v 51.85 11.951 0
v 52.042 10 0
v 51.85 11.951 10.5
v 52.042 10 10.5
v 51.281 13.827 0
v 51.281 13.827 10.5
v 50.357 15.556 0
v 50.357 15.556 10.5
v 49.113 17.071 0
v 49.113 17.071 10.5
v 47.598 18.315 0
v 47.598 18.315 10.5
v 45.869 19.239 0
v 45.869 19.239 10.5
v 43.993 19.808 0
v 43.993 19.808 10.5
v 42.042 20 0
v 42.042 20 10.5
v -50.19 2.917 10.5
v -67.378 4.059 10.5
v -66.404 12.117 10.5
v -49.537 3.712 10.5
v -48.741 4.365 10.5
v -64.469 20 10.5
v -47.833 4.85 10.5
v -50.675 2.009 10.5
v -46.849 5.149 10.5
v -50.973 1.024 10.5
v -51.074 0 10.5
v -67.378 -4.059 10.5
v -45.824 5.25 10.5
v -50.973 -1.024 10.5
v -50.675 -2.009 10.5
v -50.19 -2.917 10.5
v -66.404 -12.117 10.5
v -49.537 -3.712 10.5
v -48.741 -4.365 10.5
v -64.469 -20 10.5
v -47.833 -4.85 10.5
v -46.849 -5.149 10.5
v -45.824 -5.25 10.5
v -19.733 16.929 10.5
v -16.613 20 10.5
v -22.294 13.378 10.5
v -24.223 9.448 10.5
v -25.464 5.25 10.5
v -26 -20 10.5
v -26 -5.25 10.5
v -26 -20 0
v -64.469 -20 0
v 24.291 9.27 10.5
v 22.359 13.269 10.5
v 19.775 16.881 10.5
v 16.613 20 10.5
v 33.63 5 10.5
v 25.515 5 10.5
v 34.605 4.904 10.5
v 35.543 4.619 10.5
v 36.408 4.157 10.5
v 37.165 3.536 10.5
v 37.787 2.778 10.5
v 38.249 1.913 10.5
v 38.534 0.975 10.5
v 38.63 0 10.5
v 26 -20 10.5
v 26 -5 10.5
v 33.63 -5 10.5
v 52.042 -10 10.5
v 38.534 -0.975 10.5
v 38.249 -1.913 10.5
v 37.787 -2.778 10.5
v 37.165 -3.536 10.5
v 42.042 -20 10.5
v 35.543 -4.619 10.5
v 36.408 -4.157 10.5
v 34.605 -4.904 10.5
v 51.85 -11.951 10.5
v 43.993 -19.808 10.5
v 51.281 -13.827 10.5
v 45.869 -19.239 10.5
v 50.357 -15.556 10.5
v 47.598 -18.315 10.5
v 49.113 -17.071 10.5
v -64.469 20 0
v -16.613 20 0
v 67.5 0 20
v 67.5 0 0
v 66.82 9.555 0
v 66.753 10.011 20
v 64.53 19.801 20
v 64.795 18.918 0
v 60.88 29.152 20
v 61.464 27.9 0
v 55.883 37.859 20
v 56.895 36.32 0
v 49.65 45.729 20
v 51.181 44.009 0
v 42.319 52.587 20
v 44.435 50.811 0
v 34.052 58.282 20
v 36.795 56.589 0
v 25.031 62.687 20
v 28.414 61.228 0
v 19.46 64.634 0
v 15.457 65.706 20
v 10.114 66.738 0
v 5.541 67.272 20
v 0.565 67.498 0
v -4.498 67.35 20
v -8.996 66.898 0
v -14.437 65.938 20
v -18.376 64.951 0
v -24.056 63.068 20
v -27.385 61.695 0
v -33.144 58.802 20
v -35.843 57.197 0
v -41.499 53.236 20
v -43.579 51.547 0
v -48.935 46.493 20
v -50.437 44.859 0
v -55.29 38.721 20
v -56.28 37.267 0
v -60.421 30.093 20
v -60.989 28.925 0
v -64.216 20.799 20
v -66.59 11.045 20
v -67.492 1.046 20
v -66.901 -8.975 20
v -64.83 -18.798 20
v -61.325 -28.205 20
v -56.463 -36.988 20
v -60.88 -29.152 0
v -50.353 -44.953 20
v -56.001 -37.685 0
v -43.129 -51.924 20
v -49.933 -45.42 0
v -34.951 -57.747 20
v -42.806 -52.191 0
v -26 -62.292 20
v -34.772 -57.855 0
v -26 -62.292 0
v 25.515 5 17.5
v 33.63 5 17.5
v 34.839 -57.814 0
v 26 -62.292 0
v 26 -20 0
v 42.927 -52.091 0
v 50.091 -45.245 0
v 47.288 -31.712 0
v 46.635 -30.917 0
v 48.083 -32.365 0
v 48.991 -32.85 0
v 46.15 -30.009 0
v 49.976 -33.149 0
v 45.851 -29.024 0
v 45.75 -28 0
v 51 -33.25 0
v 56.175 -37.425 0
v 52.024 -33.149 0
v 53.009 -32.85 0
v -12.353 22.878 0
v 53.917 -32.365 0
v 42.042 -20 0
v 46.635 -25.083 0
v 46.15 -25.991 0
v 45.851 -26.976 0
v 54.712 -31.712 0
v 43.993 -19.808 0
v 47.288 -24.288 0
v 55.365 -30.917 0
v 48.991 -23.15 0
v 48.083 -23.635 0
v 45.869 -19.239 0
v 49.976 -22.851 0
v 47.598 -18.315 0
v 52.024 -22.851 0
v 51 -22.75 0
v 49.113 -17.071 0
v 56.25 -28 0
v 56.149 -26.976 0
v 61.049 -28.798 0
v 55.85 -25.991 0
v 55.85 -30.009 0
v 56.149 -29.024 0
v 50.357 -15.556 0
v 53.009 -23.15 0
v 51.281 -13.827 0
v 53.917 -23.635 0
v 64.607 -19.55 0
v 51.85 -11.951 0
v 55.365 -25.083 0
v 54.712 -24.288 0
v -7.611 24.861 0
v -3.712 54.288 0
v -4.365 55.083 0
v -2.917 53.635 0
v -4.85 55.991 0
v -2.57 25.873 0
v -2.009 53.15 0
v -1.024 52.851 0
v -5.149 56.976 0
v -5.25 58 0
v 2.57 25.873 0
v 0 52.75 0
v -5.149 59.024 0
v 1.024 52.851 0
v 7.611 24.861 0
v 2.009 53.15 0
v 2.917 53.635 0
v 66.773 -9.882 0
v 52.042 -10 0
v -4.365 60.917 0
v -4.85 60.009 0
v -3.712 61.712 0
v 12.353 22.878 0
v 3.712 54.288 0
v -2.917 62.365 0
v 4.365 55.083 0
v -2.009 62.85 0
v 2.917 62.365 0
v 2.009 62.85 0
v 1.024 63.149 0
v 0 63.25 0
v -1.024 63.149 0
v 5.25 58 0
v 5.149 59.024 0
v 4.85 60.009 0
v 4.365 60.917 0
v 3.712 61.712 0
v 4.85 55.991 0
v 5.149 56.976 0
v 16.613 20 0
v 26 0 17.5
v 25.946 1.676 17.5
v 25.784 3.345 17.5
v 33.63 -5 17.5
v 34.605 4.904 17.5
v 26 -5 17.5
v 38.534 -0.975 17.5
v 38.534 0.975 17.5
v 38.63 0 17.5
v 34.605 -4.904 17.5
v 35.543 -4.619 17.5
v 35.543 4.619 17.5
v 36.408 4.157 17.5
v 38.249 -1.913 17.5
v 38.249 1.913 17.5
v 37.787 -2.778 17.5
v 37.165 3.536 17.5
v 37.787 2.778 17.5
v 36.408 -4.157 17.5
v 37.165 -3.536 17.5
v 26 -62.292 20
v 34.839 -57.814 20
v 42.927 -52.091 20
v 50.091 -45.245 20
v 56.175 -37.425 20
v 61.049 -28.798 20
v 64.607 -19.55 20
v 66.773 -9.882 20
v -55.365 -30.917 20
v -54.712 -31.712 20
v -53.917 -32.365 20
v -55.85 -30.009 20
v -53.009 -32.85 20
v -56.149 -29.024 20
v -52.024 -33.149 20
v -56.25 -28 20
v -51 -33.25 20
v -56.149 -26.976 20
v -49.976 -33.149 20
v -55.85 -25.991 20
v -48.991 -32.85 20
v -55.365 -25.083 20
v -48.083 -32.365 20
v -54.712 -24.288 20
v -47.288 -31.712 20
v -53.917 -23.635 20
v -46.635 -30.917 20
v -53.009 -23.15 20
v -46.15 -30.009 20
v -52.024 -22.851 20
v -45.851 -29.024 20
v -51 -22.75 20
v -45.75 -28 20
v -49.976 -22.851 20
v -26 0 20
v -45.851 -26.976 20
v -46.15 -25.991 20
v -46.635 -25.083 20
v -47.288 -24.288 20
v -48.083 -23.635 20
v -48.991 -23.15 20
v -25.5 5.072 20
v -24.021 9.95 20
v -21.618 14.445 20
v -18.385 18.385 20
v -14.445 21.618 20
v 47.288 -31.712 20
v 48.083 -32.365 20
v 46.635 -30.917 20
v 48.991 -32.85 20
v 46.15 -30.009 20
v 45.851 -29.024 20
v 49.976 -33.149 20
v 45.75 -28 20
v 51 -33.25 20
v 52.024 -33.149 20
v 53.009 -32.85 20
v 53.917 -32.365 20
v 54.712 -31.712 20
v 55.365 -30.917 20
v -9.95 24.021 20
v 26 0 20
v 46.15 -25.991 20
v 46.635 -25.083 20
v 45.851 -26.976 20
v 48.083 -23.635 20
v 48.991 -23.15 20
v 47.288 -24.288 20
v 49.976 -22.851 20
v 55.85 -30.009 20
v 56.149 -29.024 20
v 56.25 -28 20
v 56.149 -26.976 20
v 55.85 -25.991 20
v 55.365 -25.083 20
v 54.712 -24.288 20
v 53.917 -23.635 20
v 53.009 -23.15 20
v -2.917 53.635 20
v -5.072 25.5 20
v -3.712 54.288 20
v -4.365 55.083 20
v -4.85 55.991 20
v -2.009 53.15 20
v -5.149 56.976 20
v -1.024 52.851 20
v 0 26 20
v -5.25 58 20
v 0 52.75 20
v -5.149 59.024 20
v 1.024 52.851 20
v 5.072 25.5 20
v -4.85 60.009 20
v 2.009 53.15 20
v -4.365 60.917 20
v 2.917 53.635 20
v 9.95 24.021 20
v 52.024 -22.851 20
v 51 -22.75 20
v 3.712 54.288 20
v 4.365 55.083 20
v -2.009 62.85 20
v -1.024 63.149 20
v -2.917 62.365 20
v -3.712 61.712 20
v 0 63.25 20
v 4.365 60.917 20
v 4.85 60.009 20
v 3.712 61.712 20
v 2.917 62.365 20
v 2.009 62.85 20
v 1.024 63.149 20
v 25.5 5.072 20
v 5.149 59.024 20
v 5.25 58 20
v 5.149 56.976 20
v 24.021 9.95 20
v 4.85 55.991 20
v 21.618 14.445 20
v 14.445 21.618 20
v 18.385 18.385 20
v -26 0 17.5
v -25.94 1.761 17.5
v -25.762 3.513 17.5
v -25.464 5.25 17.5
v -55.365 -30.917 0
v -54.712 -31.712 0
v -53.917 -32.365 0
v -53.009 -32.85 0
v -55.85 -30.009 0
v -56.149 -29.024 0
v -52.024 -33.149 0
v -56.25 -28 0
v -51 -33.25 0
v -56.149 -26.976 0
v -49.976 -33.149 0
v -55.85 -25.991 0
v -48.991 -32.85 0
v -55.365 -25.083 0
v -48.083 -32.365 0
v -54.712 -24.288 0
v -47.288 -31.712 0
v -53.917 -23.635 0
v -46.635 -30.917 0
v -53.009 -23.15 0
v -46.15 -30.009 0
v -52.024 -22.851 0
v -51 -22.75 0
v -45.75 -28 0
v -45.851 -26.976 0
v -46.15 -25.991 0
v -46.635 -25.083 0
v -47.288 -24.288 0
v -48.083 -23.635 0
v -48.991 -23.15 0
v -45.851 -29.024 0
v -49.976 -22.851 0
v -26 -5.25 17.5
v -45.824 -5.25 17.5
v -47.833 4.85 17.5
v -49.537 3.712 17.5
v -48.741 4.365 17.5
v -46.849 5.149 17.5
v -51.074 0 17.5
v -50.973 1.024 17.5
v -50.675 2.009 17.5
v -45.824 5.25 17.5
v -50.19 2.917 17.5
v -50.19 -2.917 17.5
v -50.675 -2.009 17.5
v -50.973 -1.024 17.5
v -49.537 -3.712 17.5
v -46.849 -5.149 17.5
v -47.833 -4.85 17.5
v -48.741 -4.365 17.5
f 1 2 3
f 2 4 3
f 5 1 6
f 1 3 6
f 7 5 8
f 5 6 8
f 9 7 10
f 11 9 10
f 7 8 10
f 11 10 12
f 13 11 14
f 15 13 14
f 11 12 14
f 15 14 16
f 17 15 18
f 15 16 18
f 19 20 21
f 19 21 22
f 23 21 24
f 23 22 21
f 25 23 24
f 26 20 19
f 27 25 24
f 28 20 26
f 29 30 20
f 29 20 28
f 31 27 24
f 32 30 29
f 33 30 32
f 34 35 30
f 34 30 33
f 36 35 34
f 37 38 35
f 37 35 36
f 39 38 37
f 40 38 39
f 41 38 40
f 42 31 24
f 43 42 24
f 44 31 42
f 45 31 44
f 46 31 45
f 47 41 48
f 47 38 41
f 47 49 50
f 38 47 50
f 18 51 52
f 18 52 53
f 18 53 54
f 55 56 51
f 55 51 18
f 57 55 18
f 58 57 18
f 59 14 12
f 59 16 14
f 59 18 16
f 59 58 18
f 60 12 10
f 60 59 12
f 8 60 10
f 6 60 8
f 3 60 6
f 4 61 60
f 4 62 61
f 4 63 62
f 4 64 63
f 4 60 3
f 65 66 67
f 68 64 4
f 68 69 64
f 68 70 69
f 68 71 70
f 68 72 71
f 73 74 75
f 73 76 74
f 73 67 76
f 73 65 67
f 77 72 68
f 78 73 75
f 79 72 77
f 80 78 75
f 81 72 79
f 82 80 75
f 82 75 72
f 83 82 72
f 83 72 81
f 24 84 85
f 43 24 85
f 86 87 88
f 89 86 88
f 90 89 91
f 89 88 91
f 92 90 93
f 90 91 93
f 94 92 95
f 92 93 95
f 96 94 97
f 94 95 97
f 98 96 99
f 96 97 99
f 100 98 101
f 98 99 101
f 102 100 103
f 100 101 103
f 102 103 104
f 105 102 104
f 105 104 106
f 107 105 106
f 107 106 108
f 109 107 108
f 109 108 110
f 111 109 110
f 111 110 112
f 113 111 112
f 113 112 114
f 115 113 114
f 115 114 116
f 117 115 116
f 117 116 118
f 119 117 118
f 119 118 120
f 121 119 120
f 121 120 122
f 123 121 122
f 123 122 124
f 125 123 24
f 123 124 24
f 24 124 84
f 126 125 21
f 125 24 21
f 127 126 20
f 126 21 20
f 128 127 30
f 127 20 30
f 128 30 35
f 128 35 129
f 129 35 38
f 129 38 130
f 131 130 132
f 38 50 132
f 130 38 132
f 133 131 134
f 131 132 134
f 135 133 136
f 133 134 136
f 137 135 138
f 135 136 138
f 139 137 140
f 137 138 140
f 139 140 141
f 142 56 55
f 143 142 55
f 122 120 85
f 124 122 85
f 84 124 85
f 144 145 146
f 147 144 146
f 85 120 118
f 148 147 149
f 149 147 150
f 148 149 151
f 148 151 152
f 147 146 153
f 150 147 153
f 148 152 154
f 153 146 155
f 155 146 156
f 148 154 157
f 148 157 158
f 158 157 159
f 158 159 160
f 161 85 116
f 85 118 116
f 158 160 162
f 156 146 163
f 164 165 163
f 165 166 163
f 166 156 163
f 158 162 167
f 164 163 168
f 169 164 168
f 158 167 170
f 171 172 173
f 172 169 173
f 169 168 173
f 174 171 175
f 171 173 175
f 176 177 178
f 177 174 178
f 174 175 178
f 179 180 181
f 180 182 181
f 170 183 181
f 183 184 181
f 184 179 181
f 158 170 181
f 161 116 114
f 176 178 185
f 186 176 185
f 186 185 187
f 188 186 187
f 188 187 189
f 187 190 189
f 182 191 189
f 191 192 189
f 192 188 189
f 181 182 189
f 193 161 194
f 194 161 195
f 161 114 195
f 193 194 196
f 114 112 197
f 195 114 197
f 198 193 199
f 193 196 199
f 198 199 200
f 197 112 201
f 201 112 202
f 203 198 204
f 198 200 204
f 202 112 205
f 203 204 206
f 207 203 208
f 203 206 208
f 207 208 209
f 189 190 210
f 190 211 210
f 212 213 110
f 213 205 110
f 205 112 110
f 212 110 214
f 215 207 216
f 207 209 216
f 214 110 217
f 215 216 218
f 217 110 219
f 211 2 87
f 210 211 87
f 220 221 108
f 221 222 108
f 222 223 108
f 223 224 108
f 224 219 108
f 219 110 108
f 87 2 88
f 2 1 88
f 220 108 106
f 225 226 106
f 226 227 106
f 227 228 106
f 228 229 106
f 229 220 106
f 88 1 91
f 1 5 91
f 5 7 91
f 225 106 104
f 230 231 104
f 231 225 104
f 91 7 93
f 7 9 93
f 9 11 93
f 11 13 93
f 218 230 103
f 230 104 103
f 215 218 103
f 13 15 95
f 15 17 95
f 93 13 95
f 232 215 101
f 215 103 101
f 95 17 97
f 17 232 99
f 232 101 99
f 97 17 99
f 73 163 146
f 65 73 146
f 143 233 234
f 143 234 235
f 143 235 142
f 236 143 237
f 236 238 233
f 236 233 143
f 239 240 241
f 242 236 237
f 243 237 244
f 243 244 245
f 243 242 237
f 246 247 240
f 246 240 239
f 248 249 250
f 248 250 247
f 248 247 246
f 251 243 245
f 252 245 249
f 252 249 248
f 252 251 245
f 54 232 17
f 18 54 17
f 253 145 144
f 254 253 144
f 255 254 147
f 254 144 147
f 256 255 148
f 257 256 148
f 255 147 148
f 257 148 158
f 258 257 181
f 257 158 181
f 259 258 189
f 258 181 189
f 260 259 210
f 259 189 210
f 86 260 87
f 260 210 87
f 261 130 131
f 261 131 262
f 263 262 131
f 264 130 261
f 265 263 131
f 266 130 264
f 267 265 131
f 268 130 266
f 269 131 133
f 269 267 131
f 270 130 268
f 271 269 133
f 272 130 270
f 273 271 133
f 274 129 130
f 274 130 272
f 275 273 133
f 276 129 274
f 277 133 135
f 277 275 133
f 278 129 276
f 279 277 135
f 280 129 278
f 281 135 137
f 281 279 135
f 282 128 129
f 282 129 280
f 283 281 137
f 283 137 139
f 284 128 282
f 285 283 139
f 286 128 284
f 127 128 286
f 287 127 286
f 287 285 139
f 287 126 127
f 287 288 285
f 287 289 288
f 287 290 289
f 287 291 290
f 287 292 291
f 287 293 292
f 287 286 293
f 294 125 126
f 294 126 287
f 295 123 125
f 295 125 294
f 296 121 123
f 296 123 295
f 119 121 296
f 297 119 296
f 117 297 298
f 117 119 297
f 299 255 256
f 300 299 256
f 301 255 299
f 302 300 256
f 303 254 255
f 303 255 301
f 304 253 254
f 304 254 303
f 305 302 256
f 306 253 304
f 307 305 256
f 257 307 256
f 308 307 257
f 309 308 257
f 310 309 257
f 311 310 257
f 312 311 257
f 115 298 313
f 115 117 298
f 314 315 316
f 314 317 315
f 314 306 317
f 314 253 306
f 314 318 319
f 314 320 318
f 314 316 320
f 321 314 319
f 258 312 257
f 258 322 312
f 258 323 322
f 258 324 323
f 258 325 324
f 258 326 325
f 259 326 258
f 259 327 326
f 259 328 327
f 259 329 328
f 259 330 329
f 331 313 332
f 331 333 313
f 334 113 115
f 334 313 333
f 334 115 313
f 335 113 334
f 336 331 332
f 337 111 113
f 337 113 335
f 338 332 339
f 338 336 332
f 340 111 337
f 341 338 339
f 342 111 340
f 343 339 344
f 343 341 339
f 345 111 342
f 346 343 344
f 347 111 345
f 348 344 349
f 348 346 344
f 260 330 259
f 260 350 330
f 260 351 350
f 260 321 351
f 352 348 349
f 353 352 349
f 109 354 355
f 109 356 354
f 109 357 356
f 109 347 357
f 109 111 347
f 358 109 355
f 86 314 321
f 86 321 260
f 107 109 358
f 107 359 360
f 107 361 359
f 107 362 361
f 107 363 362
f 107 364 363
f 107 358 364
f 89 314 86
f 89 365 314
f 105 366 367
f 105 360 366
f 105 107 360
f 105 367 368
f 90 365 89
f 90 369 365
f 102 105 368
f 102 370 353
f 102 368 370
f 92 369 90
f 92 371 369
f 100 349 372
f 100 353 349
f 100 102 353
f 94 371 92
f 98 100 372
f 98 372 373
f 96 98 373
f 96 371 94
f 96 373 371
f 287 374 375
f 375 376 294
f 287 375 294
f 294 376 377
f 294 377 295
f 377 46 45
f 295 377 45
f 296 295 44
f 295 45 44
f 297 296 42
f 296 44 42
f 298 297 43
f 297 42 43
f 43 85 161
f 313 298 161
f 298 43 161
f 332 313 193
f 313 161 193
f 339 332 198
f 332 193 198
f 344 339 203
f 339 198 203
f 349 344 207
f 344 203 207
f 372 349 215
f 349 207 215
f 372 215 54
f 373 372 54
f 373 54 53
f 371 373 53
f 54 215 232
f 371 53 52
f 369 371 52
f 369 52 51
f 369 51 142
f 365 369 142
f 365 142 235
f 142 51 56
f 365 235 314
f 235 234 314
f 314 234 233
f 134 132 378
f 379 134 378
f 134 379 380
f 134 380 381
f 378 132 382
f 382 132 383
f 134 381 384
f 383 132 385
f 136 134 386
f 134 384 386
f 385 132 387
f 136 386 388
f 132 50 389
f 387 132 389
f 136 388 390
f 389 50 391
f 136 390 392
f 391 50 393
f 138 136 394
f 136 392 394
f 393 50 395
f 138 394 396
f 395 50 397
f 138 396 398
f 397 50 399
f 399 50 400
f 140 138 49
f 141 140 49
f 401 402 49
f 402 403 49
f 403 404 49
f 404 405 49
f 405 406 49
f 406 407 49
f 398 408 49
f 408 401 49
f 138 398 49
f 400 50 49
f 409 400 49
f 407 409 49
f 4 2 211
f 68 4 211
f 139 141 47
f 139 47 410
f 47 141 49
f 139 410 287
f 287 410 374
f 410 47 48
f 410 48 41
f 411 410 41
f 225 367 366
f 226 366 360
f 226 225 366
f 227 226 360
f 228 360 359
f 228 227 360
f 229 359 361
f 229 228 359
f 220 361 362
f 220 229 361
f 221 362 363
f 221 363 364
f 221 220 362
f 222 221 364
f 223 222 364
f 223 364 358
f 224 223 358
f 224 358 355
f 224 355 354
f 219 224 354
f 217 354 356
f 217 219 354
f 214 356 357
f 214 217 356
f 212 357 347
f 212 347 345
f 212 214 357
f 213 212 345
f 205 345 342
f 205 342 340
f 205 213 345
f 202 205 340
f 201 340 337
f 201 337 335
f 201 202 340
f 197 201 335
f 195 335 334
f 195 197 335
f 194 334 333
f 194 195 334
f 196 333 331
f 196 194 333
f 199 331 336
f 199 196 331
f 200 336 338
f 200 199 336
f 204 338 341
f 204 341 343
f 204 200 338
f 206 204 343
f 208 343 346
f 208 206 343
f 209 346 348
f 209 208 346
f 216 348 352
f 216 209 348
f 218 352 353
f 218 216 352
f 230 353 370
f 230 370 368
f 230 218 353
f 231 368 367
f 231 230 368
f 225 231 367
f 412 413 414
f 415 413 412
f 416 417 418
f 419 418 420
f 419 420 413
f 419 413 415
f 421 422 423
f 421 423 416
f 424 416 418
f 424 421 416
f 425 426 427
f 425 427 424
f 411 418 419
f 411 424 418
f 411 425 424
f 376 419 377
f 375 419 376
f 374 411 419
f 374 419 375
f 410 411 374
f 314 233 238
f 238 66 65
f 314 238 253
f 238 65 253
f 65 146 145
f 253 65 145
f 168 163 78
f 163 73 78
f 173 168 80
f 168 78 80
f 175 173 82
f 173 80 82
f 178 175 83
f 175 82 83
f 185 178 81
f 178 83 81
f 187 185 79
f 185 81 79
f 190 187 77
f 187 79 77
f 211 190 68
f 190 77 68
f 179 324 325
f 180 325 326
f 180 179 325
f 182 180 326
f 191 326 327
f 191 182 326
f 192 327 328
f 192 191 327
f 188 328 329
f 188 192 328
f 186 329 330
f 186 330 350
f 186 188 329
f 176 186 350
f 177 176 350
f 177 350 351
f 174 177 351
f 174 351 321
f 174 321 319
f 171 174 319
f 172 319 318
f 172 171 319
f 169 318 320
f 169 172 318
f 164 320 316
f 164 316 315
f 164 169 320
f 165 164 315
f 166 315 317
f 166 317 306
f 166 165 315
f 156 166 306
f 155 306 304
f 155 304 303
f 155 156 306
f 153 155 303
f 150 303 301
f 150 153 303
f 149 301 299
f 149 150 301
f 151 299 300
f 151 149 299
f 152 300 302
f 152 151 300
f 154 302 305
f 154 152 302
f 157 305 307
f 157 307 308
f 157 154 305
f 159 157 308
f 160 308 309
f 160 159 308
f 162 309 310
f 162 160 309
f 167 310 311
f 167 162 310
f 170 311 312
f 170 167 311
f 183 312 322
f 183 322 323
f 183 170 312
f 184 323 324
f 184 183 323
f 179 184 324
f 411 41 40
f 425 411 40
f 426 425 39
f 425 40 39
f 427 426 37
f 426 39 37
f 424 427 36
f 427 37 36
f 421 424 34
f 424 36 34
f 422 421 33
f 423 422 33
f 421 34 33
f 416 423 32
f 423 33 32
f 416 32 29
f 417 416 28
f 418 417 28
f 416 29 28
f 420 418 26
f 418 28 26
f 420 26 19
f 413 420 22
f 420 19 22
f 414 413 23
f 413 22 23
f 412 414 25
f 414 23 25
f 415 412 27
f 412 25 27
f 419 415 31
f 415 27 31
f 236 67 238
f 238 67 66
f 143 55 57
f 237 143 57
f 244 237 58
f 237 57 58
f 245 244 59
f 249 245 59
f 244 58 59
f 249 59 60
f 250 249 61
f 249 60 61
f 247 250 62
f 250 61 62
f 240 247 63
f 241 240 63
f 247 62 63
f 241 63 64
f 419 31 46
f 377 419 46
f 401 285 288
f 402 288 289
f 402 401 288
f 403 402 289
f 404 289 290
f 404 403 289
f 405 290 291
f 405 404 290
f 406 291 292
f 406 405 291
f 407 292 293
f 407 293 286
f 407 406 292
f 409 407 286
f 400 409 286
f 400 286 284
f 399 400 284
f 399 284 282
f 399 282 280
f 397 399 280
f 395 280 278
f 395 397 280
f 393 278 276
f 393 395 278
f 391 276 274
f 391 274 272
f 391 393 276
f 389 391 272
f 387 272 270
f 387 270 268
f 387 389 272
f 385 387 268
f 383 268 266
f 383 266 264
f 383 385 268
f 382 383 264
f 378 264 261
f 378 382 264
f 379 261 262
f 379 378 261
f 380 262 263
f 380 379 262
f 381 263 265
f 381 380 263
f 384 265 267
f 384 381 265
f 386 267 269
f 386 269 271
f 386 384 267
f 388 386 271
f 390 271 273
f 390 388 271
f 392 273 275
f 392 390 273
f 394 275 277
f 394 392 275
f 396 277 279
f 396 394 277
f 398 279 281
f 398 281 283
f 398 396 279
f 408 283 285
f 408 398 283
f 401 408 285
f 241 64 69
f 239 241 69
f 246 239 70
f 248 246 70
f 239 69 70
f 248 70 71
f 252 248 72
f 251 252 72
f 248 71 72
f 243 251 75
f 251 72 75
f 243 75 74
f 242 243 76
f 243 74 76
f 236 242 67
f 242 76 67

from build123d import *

# Parameters (mm, degrees)
F0_R     = 5.25
F1_DEPTH = 20
F3_DEPTH = 10.5
F4_R     = 10
F6_DEPTH = 7
F8_DEPTH = 7


with BuildPart() as f1:
    # F0 (on Top) → F1 (new body)
    with BuildSketch(Plane.XY):
        with BuildLine():
            ThreePointArc((26, -62.2916527313), (56.1749499332, -37.4249248496), (67.5, 0))
            ThreePointArc((67.5, 0), (-37.4249248496, 56.1749499332), (-26, -62.2916527313))
            Line((-26, -62.2916527313), (-26, 0))
            ThreePointArc((-26, 0), (0, 26), (26, 0))
            Line((26, 0), (26, -62.2916527313))
        make_face()
        with Locations((-51, -28)):
            Circle(F0_R, mode=Mode.SUBTRACT)
        with Locations((51, -28)):
            Circle(F0_R, mode=Mode.SUBTRACT)
        with Locations((0, 58)):
            Circle(F0_R, mode=Mode.SUBTRACT)
    extrude(amount=F1_DEPTH)

    # F2 (on face) → F3 (cut)
    with BuildSketch(Plane(origin=(0, 0, 0), x_dir=(1, 0, 0), z_dir=(0, 0, -1))):
        with BuildLine():
            Line((16.6132477258, -20), (52.0419568735, -20))
            Line((52.0419568735, -20), (52.0419568735, 20))
            Line((52.0419568735, 20), (26, 20))
            Line((26, 20), (26, 0))
            ThreePointArc((26, 0), (23.5366144642, -11.0466184674), (16.6132477258, -20))
        make_face()
        with BuildLine():
            Line((-64.4689847911, -20), (-16.6132477258, -20))
            ThreePointArc((-16.6132477258, -20), (-23.5366144642, -11.0466184674), (-26, 0))
            Line((-26, 0), (-26, 20))
            Line((-26, 20), (-64.4689847911, 20))
            ThreePointArc((-64.4689847911, 20), (-67.5, 0), (-64.4689847911, -20))
        make_face()
    extrude(amount=-F3_DEPTH, mode=Mode.SUBTRACT)

    # F4
    f4_edges = [f1.edges().sort_by_distance(p)[0] for p in [
        (52.041957, 20, 5.25),
        (52.041957, -20, 5.25),
    ]]
    fillet(f4_edges, radius=F4_R)

    # F5 (on face) → F6 (cut)
    with BuildSketch(Plane(origin=(0, 0, 10.5), x_dir=(1, 0, 0), z_dir=(0, 0, -1))):
        with BuildLine():
            ThreePointArc((33.629886806, -5), (37.1654207119, -3.5355339059), (38.629886806, 0))
            ThreePointArc((38.629886806, 0), (37.1654207119, 3.5355339059), (33.629886806, 5))
            ThreePointArc((33.629886806, 5), (28.629886806, 0), (33.629886806, -5))
        make_face()
        with BuildLine():
            ThreePointArc((33.629886806, -5), (28.629886806, 0), (33.629886806, 5))
            Line((33.629886806, 5), (26, 5))
            Line((26, 5), (26, 0))
            ThreePointArc((26, 0), (25.8783910121, -2.511748121), (25.5147016443, -5))
            Line((25.5147016443, -5), (33.629886806, -5))
        make_face()
    extrude(amount=-F6_DEPTH, mode=Mode.SUBTRACT)

    # F7 (on face) → F8 (cut)
    with BuildSketch(Plane(origin=(0, 0, 10.5), x_dir=(1, 0, 0), z_dir=(0, 0, -1))):
        with BuildLine():
            ThreePointArc((-45.8243116736, -5.25), (-42.1120010724, -3.7123106012), (-40.5743116736, 0))
            ThreePointArc((-40.5743116736, 0), (-42.1120010724, 3.7123106012), (-45.8243116736, 5.25))
            ThreePointArc((-45.8243116736, 5.25), (-51.0743116736, 0), (-45.8243116736, -5.25))
        make_face()
        with BuildLine():
            ThreePointArc((-45.8243116736, 5.25), (-42.1120010724, 3.7123106012), (-40.5743116736, 0))
            ThreePointArc((-40.5743116736, 0), (-42.1120010724, -3.7123106012), (-45.8243116736, -5.25))
            Line((-45.8243116736, -5.25), (-25.4644359843, -5.25))
            ThreePointArc((-25.4644359843, -5.25), (-25.8657624631, -2.6386231644), (-26, 0))
            Line((-26, 0), (-26, 5.25))
            Line((-26, 5.25), (-45.8243116736, 5.25))
        make_face()
    extrude(amount=-F8_DEPTH, mode=Mode.SUBTRACT)


solid = f1.part
